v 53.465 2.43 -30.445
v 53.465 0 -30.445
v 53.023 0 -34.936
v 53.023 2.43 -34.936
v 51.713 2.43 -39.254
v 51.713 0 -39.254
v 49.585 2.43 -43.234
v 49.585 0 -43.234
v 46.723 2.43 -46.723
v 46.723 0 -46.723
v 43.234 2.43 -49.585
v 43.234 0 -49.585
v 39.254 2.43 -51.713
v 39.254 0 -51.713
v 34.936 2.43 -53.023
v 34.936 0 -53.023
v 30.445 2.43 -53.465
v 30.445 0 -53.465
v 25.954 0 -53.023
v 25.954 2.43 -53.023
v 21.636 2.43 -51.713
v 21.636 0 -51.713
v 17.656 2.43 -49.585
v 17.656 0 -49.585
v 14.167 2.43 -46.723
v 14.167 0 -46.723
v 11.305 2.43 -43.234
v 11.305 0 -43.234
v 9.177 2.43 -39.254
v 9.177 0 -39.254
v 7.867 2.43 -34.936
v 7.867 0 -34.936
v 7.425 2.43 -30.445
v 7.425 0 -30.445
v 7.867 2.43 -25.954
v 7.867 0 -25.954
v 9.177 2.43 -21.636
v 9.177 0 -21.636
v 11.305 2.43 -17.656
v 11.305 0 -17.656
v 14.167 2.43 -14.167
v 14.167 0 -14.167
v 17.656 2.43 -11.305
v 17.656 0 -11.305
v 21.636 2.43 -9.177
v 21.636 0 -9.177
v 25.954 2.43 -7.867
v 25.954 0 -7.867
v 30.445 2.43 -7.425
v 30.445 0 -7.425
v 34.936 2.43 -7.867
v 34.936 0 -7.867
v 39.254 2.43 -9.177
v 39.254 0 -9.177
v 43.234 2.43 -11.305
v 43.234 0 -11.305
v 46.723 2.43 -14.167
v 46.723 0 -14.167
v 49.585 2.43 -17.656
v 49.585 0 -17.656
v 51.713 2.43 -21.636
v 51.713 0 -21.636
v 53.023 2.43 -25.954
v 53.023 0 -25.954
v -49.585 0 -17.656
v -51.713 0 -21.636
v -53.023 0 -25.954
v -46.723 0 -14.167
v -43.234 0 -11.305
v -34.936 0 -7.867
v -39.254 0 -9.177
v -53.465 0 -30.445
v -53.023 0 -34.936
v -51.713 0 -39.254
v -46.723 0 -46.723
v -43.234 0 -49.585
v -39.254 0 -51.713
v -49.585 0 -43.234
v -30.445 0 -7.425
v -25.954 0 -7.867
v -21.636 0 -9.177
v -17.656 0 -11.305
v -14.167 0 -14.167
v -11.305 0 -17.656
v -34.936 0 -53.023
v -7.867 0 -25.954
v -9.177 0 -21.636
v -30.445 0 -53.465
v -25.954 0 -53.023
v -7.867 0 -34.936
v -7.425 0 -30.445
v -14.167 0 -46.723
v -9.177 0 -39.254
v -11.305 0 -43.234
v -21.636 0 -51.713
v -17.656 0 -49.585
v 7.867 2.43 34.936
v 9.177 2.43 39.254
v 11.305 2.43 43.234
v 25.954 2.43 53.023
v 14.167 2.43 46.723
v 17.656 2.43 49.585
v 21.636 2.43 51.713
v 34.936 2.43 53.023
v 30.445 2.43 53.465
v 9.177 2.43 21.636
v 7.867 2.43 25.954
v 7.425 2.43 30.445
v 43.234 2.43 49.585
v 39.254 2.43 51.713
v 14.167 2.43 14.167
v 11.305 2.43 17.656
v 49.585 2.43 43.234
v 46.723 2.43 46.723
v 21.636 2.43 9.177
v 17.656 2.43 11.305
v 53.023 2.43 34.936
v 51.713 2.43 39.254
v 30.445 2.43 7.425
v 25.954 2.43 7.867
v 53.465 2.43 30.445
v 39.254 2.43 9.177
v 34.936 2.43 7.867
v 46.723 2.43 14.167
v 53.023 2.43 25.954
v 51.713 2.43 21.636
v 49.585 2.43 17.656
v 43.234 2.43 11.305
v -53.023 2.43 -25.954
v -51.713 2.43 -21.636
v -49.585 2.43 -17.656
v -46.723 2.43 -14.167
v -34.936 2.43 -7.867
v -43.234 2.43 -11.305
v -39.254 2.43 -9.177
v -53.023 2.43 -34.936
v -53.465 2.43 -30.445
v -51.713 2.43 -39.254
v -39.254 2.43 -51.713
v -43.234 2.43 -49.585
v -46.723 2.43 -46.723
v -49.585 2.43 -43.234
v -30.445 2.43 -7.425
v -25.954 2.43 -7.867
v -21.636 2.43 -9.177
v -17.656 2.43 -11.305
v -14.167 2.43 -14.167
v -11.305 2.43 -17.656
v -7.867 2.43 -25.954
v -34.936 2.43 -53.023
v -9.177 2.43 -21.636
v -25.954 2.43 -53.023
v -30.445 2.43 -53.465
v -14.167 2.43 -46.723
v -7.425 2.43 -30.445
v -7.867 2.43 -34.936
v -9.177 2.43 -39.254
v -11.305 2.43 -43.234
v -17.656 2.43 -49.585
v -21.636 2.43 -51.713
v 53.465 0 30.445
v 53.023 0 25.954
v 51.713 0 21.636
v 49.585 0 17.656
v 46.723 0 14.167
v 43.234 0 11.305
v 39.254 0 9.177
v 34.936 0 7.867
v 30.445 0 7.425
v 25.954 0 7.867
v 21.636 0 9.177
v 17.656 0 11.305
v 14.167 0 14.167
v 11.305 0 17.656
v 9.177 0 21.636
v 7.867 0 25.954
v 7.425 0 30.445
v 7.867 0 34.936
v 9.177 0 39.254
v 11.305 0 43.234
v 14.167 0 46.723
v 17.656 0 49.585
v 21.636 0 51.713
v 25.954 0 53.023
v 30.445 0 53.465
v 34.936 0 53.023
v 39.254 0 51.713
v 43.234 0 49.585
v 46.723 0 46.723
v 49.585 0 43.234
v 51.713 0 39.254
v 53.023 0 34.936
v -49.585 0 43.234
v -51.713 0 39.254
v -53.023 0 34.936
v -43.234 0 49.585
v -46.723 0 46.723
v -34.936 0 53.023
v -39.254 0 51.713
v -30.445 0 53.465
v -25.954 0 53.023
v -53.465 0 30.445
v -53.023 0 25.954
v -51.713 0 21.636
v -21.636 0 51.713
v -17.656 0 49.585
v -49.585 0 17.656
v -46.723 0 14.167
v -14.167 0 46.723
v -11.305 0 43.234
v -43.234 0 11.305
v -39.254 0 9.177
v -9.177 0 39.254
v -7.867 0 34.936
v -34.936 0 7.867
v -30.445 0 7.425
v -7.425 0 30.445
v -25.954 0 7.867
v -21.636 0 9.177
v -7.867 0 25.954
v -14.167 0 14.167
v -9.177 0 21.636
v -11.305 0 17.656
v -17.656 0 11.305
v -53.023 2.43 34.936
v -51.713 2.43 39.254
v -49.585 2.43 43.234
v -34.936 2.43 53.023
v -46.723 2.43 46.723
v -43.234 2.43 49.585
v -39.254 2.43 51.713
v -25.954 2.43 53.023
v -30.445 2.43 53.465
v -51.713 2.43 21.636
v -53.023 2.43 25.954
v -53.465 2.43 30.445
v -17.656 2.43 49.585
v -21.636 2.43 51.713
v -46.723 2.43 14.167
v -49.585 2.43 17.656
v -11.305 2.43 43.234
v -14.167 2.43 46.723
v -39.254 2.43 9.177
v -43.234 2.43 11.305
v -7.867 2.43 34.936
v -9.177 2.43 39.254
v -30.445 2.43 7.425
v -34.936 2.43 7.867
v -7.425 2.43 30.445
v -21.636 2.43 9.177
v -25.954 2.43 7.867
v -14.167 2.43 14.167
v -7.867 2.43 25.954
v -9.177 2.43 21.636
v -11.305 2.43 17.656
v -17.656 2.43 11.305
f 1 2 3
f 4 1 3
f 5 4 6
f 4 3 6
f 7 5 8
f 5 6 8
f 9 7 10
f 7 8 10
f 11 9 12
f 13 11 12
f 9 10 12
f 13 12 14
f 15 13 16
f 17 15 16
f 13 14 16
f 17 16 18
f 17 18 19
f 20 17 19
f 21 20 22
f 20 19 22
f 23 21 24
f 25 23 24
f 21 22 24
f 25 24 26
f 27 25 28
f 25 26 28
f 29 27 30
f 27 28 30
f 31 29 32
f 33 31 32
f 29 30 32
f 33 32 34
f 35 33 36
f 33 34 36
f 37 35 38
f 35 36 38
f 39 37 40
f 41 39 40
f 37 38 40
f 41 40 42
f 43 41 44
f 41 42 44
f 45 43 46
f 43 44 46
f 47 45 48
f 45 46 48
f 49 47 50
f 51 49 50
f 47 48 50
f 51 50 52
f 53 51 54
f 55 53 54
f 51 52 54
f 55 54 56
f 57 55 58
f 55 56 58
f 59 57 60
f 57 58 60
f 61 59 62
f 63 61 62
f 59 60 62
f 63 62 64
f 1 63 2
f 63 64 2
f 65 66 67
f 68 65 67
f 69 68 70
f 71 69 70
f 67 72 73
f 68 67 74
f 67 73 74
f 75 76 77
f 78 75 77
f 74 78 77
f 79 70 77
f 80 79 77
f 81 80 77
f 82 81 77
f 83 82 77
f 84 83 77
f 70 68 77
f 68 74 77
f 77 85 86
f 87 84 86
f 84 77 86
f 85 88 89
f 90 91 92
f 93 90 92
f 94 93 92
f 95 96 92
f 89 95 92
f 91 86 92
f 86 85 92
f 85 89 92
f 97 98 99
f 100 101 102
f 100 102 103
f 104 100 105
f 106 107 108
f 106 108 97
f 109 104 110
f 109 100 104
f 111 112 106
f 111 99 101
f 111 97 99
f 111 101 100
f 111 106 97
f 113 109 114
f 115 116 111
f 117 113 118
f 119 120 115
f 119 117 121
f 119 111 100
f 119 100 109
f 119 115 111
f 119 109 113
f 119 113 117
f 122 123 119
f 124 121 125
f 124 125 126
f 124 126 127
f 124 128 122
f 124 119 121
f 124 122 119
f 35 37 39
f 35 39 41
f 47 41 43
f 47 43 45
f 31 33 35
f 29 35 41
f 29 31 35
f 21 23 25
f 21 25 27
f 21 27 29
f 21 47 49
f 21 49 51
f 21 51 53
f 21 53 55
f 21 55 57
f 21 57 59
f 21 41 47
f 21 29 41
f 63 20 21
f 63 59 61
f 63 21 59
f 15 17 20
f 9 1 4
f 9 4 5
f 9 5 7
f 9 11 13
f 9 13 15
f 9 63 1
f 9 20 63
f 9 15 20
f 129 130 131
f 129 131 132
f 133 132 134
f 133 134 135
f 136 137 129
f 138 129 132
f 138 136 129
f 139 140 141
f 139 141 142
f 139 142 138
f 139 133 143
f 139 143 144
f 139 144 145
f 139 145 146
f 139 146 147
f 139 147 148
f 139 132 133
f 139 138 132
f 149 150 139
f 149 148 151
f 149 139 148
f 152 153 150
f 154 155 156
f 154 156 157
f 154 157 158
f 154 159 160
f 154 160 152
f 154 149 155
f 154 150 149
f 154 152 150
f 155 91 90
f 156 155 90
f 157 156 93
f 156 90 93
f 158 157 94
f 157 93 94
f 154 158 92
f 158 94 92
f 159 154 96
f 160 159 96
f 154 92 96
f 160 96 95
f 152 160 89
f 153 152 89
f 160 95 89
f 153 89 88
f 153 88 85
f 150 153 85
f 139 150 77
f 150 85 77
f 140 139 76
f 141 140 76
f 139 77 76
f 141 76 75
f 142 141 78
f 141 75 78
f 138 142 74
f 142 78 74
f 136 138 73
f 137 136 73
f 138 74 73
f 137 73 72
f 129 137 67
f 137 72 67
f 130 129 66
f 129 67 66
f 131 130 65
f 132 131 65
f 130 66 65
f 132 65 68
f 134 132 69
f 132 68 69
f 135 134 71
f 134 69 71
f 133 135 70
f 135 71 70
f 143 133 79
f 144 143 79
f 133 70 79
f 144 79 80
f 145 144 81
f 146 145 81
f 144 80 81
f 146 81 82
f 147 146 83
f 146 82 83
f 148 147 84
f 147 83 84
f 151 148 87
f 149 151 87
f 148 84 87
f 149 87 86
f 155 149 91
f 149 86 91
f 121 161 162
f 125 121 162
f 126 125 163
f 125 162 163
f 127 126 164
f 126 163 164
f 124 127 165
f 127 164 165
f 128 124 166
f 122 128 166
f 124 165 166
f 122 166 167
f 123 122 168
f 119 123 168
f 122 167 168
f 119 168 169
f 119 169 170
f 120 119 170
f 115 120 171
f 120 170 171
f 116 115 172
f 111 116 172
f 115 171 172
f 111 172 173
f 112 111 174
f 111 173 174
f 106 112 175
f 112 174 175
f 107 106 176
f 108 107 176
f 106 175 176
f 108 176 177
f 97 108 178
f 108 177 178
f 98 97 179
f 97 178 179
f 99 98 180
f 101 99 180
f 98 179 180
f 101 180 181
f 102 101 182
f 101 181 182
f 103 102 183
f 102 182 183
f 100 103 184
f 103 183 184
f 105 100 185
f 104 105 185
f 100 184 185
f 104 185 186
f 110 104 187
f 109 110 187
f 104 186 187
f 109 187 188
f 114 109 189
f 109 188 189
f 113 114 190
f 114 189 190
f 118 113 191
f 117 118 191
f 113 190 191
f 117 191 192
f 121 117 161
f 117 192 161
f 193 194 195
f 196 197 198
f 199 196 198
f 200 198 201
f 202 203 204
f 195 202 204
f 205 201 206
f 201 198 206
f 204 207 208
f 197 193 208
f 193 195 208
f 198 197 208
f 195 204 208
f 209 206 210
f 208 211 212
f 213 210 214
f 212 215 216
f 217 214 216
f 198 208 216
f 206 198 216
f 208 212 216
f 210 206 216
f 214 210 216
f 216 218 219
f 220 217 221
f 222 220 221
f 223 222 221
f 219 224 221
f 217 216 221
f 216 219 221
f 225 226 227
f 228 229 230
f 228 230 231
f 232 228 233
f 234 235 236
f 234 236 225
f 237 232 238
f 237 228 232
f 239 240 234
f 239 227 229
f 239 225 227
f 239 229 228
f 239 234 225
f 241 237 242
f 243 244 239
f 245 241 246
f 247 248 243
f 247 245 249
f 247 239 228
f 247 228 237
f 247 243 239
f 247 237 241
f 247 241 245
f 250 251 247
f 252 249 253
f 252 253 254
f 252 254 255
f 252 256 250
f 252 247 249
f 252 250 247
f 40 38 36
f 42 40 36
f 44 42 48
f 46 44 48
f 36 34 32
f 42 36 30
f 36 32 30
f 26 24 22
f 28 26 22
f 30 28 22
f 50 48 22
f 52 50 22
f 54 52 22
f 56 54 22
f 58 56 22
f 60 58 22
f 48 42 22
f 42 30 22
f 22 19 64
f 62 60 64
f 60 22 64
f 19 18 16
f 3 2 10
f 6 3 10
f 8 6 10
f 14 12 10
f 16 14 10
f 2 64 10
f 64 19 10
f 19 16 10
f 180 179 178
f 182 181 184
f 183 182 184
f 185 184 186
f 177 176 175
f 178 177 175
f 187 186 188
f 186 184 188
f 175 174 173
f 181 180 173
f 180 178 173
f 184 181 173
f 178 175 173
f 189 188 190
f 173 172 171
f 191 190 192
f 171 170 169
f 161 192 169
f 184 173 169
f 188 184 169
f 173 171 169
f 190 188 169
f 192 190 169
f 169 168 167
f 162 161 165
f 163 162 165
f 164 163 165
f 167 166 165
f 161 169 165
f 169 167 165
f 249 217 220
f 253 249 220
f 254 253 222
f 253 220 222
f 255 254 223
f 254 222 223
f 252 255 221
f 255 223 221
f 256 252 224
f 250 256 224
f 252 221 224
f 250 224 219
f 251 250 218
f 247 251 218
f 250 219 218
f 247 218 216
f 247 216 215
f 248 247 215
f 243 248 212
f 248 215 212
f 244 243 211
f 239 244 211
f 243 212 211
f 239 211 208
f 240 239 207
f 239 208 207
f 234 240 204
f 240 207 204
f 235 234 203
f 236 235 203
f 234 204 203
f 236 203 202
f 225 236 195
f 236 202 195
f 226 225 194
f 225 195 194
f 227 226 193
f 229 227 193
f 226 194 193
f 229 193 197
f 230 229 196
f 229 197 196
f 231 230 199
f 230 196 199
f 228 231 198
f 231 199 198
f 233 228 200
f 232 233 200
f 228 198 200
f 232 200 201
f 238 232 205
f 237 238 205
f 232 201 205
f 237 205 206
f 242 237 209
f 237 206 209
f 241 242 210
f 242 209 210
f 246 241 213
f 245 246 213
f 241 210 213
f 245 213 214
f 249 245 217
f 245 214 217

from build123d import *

# Parameters (mm, degrees)
SKETCH1_R             = 23.02
BOSS_EXTRUDE1_DEPTH   = 2.43
BOSS_EXTRUDE1_2_DEPTH = 2.43
BOSS_EXTRUDE1_3_DEPTH = 2.43
BOSS_EXTRUDE1_4_DEPTH = 2.43


with BuildPart() as part:
    # Sketch1 → Boss-Extrude1 (new body)
    with BuildSketch(Plane(origin=(0, 0, 0), x_dir=(1, 0, 0), z_dir=(0, 1, 0))):
        with Locations((-30.445, 30.445)):
            Circle(SKETCH1_R)
    extrude(amount=BOSS_EXTRUDE1_DEPTH)


with BuildPart() as body_2:
    # Sketch1 → Boss-Extrude1 2 (new body)
    with BuildSketch(Plane(origin=(0, 0, 0), x_dir=(1, 0, 0), z_dir=(0, 1, 0))):
        with Locations((30.445, 30.445)):
            Circle(SKETCH1_R)
    extrude(amount=BOSS_EXTRUDE1_2_DEPTH)


with BuildPart() as body_3:
    # Sketch1 → Boss-Extrude1 3 (new body)
    with BuildSketch(Plane(origin=(0, 0, 0), x_dir=(1, 0, 0), z_dir=(0, 1, 0))):
        with Locations((30.445, -30.445)):
            Circle(SKETCH1_R)
    extrude(amount=BOSS_EXTRUDE1_3_DEPTH)


with BuildPart() as body_4:
    # Sketch1 → Boss-Extrude1 4 (new body)
    with BuildSketch(Plane(origin=(0, 0, 0), x_dir=(1, 0, 0), z_dir=(0, 1, 0))):
        with Locations((-30.445, -30.445)):
            Circle(SKETCH1_R)
    extrude(amount=BOSS_EXTRUDE1_4_DEPTH)


solid = Compound([part.part, body_2.part, body_3.part, body_4.part])
